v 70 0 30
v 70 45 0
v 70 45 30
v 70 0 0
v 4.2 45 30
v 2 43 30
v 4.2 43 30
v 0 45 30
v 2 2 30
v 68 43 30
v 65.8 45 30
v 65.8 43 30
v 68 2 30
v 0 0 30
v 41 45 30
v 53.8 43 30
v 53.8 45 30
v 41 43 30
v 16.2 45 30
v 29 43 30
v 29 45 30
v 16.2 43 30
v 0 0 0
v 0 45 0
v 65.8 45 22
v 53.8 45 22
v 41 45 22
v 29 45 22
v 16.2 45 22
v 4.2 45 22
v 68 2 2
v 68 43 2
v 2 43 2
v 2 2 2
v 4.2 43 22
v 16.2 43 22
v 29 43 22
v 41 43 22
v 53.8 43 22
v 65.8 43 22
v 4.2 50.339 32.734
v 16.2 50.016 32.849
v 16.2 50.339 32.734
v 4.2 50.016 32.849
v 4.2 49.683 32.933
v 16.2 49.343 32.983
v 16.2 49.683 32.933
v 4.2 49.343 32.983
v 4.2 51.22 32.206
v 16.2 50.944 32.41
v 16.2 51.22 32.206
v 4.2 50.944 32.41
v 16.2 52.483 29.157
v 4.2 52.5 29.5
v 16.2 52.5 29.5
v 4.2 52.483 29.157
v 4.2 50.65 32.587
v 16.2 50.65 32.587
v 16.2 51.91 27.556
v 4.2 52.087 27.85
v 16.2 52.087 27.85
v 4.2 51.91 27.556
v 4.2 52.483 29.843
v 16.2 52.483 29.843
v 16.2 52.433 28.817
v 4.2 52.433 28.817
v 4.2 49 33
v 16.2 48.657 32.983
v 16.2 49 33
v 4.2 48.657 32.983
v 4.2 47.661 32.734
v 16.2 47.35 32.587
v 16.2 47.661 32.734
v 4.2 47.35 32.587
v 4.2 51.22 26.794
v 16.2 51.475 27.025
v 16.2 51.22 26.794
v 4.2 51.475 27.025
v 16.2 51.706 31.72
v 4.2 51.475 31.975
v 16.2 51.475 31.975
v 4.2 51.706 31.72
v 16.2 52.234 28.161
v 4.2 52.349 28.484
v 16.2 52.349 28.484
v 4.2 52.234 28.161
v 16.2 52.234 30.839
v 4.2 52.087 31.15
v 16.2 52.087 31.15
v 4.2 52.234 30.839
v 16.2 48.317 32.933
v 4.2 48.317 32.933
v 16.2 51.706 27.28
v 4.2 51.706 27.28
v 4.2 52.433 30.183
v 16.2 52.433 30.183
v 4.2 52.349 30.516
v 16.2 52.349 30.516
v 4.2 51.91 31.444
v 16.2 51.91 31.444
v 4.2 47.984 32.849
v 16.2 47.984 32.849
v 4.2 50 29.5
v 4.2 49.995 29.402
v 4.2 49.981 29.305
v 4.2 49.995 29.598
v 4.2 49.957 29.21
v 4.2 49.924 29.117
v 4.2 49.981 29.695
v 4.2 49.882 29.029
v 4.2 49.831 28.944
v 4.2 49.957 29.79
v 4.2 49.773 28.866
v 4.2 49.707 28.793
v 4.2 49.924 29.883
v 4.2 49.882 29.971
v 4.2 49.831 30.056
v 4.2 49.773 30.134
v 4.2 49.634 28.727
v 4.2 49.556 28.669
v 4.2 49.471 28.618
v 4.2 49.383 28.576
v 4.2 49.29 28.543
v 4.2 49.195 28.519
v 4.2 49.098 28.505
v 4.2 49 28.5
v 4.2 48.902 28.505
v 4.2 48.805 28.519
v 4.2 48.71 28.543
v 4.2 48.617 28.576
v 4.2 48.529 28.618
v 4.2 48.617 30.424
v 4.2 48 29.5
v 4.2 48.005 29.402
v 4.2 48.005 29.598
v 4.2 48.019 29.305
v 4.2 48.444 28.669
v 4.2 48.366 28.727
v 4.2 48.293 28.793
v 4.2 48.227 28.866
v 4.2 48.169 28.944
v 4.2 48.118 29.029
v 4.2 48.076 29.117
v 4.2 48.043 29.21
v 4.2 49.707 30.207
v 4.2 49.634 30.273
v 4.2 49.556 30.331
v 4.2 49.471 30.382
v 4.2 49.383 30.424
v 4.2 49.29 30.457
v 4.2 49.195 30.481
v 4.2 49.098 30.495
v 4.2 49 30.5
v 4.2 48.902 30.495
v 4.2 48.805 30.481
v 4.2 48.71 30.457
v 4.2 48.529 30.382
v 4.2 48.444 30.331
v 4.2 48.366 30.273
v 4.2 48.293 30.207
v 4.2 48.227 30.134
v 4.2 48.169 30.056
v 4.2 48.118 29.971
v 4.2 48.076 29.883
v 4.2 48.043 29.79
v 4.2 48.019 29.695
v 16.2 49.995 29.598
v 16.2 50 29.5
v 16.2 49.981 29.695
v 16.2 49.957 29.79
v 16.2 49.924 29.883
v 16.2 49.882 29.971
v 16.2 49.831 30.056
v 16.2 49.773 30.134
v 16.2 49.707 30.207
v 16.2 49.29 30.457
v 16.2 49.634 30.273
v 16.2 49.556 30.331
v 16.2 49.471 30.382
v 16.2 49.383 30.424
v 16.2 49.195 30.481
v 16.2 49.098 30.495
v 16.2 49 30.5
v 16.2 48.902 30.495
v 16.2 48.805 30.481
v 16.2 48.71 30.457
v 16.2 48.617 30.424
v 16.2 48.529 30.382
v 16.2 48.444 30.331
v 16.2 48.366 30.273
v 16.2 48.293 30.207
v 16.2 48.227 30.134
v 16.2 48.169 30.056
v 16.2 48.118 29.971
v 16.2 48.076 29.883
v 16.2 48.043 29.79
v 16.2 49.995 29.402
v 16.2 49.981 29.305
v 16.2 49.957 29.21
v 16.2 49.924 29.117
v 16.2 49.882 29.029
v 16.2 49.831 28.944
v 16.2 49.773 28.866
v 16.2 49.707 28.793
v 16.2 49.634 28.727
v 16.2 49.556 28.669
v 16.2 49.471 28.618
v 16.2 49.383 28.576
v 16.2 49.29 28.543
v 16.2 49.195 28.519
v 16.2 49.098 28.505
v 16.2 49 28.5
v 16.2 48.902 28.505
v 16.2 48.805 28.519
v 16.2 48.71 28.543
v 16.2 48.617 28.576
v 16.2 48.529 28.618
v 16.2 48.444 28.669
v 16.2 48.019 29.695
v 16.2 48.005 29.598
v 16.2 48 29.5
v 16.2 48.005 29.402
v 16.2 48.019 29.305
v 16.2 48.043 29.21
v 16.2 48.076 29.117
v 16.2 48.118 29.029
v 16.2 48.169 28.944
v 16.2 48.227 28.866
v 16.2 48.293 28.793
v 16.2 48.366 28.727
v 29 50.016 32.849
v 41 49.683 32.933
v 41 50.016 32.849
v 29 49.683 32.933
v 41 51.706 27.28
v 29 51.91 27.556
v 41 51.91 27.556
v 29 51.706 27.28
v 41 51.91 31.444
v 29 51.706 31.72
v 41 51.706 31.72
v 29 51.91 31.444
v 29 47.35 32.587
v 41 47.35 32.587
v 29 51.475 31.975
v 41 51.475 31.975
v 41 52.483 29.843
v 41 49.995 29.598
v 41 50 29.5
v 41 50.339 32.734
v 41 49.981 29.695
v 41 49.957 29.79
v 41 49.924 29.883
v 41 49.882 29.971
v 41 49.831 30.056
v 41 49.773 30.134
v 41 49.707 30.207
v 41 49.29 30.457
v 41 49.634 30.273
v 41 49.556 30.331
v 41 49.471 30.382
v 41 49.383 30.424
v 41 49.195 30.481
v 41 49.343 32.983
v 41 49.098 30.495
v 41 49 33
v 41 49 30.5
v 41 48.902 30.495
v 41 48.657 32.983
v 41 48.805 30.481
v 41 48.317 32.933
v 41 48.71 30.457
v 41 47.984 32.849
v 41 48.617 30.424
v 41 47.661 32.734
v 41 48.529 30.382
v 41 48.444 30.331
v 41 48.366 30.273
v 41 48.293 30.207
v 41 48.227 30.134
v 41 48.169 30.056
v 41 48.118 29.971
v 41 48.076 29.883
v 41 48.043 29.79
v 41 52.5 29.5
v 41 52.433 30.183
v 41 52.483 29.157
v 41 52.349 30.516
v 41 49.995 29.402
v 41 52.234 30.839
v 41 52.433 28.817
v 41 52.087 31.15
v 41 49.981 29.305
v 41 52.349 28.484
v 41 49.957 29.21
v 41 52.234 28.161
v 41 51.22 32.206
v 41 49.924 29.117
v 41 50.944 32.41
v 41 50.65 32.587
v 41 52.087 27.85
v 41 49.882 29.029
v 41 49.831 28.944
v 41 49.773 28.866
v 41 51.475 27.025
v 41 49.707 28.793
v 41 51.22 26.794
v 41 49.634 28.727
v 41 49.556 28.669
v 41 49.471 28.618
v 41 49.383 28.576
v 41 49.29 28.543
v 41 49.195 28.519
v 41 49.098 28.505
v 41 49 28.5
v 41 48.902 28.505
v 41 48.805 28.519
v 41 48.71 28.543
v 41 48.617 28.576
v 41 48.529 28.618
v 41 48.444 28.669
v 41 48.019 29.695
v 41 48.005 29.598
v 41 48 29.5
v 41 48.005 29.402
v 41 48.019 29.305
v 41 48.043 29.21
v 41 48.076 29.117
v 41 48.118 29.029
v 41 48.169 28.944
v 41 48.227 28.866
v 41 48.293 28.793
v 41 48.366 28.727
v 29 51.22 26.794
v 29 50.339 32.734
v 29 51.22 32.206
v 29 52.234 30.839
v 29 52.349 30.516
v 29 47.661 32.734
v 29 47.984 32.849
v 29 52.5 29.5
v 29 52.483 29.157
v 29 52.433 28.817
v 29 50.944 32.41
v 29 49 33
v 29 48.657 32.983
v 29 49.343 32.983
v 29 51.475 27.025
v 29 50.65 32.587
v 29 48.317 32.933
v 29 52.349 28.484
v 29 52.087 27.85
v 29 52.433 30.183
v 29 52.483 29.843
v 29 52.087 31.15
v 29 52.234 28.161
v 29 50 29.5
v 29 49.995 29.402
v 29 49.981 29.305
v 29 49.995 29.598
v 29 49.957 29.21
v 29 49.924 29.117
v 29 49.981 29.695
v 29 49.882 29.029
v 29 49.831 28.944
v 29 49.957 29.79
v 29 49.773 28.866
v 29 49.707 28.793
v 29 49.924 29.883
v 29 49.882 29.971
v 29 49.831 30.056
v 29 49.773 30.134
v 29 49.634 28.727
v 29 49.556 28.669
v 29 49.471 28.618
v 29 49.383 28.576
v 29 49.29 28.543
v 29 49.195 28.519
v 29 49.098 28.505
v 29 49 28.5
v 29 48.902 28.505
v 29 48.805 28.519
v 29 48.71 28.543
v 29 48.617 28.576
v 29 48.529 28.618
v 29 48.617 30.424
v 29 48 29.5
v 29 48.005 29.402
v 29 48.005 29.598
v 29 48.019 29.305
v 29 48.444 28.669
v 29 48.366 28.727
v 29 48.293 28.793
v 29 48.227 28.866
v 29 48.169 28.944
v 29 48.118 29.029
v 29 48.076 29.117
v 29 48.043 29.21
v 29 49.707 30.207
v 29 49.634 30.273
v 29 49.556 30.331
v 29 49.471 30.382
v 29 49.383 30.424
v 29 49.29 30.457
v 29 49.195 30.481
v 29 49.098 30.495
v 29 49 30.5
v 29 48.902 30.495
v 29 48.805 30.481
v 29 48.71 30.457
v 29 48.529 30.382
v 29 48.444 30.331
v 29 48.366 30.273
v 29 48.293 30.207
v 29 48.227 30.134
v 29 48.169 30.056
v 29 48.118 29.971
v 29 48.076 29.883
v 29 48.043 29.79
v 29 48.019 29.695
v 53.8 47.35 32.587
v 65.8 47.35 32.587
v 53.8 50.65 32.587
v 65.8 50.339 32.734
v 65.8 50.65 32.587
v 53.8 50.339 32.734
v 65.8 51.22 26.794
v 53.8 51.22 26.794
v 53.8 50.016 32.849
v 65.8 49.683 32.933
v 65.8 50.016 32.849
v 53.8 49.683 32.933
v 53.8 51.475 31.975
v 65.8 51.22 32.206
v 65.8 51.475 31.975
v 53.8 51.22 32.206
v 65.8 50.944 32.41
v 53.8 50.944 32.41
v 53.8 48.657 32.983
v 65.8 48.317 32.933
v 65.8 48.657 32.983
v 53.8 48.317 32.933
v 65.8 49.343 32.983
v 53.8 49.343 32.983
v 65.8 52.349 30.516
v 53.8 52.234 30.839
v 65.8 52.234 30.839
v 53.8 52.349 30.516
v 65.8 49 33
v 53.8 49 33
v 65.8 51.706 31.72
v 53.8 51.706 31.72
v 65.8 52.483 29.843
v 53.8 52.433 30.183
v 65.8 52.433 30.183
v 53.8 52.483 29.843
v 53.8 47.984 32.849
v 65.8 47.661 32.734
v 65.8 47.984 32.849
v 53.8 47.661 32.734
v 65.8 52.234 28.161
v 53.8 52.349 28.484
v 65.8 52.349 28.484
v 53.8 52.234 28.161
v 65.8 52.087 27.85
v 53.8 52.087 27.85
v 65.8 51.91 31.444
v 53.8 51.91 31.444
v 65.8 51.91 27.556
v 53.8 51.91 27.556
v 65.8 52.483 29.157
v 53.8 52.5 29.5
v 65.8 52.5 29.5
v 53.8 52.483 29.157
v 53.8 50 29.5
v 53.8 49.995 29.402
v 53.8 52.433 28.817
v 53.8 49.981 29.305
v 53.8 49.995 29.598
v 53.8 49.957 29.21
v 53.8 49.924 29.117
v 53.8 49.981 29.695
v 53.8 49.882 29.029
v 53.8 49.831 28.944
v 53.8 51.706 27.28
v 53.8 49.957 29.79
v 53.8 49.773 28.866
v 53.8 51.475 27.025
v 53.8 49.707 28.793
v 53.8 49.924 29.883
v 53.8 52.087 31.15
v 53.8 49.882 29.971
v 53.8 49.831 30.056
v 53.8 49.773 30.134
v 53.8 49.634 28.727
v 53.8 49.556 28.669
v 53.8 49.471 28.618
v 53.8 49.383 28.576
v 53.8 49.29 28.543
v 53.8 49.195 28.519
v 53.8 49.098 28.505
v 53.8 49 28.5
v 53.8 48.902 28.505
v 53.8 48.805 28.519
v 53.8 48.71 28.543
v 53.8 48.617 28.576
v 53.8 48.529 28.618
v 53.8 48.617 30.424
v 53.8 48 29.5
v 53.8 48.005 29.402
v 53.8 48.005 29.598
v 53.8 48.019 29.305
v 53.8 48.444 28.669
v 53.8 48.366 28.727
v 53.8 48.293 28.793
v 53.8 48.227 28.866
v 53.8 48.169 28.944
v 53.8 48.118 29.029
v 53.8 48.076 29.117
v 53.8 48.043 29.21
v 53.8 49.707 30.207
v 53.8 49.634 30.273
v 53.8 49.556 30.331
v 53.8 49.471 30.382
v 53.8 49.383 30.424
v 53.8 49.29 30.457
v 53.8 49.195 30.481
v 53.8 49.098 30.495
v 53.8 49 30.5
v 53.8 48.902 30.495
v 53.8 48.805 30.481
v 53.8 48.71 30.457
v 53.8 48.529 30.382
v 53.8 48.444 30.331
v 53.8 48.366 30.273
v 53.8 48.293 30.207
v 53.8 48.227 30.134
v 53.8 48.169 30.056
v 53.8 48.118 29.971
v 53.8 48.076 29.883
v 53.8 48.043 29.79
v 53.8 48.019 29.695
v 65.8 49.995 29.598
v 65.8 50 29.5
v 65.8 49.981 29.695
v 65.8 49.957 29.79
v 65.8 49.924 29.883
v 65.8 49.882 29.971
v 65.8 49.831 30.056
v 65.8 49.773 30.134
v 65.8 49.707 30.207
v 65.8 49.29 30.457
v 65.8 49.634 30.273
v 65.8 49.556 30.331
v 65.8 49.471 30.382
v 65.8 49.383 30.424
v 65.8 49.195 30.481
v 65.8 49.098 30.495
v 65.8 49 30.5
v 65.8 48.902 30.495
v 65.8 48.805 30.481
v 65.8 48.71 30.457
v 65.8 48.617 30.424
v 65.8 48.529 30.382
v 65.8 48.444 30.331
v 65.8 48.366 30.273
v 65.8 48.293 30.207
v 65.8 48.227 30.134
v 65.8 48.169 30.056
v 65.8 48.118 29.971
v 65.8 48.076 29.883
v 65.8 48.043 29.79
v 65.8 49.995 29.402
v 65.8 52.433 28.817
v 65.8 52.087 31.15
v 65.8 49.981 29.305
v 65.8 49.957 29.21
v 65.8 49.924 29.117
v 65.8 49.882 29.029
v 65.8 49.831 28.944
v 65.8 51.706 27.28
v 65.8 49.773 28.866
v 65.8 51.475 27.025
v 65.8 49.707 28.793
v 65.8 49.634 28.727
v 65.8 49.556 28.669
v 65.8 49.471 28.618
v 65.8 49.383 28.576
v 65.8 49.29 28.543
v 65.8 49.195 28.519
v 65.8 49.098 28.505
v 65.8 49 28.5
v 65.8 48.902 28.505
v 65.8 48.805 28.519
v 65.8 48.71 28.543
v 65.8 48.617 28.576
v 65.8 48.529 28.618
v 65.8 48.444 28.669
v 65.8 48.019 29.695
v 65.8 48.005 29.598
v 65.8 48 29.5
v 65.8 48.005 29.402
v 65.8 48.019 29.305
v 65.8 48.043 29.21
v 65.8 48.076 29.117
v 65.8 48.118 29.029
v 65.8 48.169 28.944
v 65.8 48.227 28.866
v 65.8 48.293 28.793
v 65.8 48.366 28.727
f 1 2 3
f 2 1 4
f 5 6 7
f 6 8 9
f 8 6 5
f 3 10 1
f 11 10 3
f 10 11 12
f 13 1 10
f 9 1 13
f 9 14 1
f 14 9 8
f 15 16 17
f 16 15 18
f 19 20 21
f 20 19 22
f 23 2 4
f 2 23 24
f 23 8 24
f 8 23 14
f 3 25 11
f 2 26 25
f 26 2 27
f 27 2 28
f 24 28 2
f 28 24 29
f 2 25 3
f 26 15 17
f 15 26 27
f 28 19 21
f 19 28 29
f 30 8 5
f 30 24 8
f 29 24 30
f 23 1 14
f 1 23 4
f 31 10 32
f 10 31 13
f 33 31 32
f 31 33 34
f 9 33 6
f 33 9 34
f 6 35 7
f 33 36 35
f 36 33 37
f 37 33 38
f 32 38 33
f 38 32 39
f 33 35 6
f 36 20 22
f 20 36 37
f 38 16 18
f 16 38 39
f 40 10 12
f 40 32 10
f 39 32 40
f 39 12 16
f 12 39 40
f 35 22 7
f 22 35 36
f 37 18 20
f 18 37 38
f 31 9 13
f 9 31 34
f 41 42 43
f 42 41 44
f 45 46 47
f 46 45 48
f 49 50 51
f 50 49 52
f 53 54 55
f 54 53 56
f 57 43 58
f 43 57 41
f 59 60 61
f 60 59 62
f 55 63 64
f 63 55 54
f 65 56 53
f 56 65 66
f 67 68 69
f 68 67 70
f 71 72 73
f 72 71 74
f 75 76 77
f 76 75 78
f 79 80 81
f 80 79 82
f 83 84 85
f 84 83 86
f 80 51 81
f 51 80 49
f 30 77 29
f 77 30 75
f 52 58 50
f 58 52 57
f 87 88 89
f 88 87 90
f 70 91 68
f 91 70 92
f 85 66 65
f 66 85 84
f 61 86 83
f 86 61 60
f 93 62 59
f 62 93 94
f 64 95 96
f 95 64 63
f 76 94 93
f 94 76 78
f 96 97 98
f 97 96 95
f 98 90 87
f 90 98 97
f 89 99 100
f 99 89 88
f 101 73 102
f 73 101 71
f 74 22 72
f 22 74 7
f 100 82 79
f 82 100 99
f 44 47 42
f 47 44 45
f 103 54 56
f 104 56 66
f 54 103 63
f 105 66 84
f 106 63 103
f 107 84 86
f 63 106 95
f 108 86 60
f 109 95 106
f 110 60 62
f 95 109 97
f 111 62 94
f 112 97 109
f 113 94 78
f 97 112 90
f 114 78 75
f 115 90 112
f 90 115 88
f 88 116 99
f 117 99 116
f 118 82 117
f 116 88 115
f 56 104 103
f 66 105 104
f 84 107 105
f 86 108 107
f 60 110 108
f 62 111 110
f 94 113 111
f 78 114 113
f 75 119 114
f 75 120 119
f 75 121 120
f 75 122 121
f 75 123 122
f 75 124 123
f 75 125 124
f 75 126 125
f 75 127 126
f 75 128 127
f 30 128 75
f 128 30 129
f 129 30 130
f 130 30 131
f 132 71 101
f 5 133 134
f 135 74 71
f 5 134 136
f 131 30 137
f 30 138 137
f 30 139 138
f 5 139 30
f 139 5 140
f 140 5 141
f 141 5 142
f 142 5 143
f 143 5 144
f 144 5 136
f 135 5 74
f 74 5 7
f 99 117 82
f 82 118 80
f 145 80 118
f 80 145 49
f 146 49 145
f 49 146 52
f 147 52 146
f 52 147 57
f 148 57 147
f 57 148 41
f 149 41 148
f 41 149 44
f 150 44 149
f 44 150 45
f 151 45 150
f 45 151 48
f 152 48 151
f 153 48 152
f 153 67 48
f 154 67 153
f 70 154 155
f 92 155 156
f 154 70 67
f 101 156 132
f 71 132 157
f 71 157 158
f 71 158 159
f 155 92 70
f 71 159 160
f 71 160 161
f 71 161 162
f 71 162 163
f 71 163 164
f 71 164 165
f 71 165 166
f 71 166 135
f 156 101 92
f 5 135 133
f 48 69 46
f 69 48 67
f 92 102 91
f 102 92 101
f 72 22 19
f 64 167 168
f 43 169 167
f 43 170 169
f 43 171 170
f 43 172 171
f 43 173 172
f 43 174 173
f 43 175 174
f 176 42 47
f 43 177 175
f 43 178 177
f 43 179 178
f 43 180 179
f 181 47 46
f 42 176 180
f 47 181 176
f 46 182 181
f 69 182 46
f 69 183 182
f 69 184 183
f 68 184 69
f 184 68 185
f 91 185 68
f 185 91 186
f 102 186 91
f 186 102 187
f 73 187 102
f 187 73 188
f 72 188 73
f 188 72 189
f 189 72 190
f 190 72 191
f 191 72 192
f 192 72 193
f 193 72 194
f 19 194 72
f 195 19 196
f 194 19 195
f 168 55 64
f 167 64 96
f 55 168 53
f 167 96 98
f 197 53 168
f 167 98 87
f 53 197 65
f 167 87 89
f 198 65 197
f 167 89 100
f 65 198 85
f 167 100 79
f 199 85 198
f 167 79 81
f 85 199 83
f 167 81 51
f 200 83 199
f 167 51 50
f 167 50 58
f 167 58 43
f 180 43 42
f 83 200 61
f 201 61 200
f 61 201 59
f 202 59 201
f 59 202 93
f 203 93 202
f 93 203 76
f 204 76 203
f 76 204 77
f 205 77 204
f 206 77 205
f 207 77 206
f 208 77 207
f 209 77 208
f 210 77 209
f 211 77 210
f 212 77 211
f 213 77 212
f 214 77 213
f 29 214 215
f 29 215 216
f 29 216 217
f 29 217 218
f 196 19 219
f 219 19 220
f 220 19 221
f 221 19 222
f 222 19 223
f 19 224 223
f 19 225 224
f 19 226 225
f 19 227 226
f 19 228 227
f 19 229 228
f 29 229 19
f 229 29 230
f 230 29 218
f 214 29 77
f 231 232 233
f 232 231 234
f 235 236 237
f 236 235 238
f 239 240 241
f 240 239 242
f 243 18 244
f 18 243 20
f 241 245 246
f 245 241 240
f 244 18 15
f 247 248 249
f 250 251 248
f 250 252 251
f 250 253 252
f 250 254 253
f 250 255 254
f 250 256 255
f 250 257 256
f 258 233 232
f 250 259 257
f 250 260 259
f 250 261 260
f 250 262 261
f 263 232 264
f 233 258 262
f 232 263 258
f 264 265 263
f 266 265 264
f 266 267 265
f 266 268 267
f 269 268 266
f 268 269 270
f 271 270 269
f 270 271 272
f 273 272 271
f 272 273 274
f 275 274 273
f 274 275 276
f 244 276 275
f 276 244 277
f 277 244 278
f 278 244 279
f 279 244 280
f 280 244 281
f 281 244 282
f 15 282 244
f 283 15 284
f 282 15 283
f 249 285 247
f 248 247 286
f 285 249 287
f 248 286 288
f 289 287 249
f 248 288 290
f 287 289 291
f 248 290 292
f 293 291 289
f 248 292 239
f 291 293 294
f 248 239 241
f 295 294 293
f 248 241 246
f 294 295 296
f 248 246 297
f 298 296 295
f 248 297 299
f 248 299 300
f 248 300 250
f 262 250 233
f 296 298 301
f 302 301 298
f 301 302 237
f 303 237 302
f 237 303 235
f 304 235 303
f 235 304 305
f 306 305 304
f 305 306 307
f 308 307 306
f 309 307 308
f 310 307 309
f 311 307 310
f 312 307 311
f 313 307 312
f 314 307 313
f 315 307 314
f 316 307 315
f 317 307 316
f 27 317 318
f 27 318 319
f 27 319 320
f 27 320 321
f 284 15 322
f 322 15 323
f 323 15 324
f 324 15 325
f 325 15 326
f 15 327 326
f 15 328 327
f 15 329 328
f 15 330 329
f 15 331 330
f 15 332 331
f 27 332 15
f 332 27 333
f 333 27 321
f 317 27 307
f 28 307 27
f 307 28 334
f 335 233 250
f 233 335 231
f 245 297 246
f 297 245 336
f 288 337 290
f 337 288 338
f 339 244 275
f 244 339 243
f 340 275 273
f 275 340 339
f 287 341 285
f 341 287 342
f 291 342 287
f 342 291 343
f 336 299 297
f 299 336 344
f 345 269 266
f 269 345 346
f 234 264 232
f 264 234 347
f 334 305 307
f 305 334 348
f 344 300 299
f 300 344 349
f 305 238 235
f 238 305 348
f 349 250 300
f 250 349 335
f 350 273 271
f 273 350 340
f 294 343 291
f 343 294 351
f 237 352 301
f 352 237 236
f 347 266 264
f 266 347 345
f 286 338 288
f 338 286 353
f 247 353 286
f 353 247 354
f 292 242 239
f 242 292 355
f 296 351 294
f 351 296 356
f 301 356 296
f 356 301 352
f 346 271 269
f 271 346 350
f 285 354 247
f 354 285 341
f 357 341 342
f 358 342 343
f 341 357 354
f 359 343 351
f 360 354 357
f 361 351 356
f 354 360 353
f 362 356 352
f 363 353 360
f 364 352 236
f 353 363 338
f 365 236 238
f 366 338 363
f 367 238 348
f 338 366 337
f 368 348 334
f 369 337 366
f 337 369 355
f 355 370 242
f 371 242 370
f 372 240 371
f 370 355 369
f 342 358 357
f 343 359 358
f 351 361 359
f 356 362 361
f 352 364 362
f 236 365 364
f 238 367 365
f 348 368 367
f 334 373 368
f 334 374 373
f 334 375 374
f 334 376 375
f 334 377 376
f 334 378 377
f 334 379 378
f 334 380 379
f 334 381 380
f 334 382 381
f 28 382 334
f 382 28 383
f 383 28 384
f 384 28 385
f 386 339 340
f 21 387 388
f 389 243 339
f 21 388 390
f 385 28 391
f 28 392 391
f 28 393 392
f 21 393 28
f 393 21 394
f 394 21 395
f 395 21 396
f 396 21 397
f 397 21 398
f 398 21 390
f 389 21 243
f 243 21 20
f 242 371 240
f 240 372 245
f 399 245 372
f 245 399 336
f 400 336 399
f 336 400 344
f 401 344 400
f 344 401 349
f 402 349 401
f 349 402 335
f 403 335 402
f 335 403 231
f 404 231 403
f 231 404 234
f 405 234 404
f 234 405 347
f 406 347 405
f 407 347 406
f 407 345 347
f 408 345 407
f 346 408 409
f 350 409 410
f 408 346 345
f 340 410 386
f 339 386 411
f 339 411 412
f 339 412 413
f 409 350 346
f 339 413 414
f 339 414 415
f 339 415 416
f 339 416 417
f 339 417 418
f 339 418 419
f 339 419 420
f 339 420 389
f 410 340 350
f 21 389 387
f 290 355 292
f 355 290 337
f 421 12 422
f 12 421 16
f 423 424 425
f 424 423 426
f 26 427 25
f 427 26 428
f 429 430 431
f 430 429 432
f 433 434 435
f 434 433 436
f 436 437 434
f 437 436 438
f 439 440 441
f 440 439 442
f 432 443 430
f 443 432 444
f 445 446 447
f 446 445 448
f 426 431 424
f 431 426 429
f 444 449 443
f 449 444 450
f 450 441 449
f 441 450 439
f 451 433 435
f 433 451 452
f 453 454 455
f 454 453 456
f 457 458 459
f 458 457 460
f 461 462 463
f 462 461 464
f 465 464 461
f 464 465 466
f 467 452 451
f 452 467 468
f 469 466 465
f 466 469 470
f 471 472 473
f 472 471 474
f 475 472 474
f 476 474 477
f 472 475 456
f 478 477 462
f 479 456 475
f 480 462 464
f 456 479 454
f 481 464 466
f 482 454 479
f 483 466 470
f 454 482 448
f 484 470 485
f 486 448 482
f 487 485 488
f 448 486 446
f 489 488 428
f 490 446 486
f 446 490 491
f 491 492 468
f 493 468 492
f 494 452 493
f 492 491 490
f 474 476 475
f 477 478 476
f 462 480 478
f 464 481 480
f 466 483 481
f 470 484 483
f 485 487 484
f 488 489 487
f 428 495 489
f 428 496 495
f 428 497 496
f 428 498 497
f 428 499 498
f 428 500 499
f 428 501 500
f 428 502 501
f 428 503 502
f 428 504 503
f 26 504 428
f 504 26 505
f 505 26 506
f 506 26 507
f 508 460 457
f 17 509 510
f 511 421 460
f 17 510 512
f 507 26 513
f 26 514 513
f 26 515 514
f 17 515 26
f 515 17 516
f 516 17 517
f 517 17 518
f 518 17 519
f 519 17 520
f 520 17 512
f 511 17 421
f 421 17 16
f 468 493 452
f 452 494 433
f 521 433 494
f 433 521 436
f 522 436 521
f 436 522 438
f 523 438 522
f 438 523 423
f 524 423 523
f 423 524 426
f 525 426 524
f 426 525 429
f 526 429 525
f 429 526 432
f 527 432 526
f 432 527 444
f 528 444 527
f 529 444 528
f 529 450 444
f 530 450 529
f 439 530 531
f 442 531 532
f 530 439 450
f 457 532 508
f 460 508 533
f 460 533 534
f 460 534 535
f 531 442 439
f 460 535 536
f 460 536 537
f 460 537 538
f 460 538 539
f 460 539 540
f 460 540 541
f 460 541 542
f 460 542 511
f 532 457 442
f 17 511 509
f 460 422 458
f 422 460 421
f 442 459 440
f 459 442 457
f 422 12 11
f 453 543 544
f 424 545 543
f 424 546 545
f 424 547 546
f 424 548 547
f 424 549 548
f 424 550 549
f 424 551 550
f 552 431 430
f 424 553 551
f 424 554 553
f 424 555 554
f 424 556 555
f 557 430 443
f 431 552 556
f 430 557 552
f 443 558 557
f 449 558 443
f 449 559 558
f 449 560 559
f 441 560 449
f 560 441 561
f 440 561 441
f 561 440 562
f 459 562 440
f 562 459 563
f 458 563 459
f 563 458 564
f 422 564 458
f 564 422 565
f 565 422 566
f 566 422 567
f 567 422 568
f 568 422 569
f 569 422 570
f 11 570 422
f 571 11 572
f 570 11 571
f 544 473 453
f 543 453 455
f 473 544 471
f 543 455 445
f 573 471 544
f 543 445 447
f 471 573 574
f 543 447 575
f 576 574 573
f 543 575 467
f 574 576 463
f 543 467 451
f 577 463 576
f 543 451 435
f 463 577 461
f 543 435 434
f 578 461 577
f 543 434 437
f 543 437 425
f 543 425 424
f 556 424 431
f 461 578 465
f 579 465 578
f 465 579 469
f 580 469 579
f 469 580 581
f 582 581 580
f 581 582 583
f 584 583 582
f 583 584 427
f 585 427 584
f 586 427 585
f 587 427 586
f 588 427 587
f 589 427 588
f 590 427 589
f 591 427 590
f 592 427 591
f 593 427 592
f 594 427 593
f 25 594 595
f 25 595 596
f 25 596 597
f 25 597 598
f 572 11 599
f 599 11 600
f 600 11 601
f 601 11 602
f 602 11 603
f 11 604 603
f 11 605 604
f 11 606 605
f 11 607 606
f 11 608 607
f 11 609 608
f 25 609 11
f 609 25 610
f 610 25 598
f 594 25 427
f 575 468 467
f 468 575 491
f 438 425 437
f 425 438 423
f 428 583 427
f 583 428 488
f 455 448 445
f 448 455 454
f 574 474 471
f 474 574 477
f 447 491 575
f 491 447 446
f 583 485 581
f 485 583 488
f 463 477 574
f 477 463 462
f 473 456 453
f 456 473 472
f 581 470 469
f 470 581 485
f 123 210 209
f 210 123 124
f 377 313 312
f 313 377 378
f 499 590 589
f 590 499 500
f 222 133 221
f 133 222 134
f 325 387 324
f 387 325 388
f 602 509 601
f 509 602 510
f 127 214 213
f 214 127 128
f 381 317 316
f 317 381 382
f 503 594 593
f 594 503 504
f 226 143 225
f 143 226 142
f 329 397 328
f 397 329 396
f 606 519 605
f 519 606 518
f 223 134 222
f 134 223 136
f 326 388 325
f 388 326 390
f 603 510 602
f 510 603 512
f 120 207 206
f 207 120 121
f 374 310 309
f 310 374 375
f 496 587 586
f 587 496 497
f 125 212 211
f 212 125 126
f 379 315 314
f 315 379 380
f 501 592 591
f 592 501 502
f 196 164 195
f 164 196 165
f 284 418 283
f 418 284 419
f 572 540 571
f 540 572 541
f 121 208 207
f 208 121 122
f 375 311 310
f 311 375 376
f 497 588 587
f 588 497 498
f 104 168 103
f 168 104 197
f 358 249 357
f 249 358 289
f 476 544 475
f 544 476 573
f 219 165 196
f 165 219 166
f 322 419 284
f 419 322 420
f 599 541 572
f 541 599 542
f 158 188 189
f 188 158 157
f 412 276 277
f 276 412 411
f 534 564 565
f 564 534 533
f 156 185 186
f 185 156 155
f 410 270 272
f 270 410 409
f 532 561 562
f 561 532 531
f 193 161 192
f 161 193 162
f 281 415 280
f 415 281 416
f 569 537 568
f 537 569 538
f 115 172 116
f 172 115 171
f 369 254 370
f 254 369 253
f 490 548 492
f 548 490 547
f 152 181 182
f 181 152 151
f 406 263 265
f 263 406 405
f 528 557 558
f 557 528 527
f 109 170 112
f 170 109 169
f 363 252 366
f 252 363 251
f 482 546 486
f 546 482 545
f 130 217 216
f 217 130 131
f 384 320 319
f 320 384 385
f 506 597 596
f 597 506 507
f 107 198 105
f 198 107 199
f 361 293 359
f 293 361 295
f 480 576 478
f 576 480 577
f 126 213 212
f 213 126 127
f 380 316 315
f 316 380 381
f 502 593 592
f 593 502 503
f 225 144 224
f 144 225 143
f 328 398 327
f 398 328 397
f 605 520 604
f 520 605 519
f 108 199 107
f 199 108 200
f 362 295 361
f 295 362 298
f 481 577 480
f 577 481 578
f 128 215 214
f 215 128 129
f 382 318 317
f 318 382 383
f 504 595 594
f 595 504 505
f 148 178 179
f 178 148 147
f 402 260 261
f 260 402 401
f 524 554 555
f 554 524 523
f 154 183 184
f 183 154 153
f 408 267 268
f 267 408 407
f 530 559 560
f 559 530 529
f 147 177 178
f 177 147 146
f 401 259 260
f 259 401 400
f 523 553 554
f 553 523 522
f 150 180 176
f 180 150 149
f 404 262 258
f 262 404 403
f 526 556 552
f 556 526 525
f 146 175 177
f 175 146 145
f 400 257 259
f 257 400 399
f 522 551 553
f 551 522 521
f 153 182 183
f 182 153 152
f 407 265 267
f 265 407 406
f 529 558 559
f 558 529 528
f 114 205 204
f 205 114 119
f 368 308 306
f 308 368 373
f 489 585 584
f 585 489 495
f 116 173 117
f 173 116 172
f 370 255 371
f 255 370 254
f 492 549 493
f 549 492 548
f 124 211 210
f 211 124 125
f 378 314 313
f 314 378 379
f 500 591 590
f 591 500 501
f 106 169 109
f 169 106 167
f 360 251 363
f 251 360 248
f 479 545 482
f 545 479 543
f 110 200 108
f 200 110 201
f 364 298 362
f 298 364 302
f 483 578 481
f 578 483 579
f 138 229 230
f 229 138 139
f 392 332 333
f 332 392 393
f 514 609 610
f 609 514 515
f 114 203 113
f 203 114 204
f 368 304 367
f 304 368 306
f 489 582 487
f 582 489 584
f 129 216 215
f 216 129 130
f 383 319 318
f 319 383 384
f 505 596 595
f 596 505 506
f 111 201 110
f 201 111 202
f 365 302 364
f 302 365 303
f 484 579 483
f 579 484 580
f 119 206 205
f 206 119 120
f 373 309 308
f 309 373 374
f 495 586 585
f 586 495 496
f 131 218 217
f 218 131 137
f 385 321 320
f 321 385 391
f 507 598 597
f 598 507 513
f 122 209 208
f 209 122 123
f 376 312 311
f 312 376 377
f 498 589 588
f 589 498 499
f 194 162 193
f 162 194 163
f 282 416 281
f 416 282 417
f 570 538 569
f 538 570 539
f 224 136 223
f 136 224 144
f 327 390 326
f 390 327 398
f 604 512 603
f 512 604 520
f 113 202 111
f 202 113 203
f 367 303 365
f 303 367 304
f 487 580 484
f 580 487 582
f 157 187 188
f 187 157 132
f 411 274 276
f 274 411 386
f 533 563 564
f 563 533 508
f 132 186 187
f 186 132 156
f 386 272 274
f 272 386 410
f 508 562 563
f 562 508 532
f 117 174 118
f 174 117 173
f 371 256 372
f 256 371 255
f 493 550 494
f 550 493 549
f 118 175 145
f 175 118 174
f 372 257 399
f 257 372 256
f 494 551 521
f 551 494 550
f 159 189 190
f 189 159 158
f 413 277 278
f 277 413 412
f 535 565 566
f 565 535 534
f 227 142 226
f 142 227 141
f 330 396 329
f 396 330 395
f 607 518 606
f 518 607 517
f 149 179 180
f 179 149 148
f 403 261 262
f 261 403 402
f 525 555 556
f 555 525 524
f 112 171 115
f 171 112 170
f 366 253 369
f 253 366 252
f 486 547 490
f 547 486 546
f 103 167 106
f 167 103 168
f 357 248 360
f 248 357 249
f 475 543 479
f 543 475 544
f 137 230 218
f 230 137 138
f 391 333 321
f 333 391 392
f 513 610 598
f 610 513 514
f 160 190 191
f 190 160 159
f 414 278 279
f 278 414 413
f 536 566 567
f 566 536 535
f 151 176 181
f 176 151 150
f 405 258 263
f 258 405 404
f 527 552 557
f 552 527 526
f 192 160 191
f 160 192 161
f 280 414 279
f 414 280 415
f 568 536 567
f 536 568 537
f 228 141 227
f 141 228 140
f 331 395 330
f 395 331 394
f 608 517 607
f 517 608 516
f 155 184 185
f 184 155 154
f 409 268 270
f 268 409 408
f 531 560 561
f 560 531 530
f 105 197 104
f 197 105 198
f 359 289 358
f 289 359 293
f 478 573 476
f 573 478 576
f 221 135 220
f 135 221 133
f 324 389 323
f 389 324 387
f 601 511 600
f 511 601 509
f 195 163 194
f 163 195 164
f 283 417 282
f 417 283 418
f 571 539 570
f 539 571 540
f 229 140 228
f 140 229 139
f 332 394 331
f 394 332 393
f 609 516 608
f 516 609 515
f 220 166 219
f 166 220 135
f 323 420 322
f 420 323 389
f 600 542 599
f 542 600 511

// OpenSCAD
// T4 reference for the grader's self-check (test_grade.py): a pin-hinged
// box, body and lid, -D part="body" or "lid". The other variables are
// overridden to make the wrong variants: `wall`, `kn_d` (knuckle outer
// diameter), `hole` (pin hole), `gap` (between neighbouring knuckles) and
// `lid_dz` (moves the lid's knuckles off the body's axis when closed).
// `turn` turns both parts about z, so the hinge runs along y. `ribs`
// (a length) carries each body knuckle on a rib that long, centred on it,
// down the back wall to the floor (a T4 part in cad-20261003T013729Z had
// 12): hinge, not box.
part = "body";
size = [70, 45, 30];
wall = 2;
floor_t = 2;
lid_t = 3;
kn_d = 7;
kn_l = 12;
gap = 0.4;
hole = 2;
lid_dz = 0;
turn = 0;
ribs = 0;
$fn = 64;

// The hinge axis, in the closed box's coordinates: along x, just behind
// the back wall (y = 45) with 0.5 of play, and low enough that the
// knuckles' tops are flush with the closed lid's top.
ax = [size.y + kn_d / 2 + 0.5, size.z + lid_t - kn_d / 2];
span = 5 * kn_l + 4 * gap;
function kx(i) = (size.x - span) / 2 + i * (kn_l + gap);

module knuckle(i) translate([kx(i), ax[0], ax[1]]) rotate([0, 90, 0]) cylinder(d = kn_d, h = kn_l);

module pin_hole() translate([-1, ax[0], ax[1]]) rotate([0, 90, 0]) cylinder(d = hole, h = size.x + 2);

module body() difference() {
    union() {
        difference() {
            cube(size);
            translate([wall, wall, floor_t]) cube([size.x - 2 * wall, size.y - 2 * wall, size.z]);
        }
        // Each body knuckle hulls down onto the back wall at 45 degrees,
        // so it prints without support; the hull stays under the rim.
        for (i = [0, 2, 4]) hull() {
            knuckle(i);
            translate([kx(i), size.y - wall, ax[1] - (ax[0] - size.y) - kn_d / 2]) cube([kn_l, wall, 0.01]);
            translate([kx(i), size.y - wall, size.z - 0.01]) cube([kn_l, wall, 0.01]);
        }
        if (ribs > 0) for (i = [0, 2, 4])
            translate([kx(i) + kn_l / 2 - ribs / 2, size.y - 0.01, 0]) cube([ribs, 2.01, size.z - 4]);
    }
    pin_hole();
}

module lid_closed() difference() {
    union() {
        translate([0, 0, size.z]) cube([size.x, size.y, lid_t]);
        for (i = [1, 3]) translate([0, 0, lid_dz]) hull() {
            knuckle(i);
            translate([kx(i), size.y - 1, size.z]) cube([kn_l, 1, lid_t]);
        }
    }
    translate([0, 0, lid_dz]) pin_hole();
}

rotate([0, 0, turn])
    if (part == "body") body();
    else  // printed upside down: its top face on the bed, knuckles up
        translate([0, 0, size.z + lid_t]) rotate([180, 0, 0]) lid_closed();
